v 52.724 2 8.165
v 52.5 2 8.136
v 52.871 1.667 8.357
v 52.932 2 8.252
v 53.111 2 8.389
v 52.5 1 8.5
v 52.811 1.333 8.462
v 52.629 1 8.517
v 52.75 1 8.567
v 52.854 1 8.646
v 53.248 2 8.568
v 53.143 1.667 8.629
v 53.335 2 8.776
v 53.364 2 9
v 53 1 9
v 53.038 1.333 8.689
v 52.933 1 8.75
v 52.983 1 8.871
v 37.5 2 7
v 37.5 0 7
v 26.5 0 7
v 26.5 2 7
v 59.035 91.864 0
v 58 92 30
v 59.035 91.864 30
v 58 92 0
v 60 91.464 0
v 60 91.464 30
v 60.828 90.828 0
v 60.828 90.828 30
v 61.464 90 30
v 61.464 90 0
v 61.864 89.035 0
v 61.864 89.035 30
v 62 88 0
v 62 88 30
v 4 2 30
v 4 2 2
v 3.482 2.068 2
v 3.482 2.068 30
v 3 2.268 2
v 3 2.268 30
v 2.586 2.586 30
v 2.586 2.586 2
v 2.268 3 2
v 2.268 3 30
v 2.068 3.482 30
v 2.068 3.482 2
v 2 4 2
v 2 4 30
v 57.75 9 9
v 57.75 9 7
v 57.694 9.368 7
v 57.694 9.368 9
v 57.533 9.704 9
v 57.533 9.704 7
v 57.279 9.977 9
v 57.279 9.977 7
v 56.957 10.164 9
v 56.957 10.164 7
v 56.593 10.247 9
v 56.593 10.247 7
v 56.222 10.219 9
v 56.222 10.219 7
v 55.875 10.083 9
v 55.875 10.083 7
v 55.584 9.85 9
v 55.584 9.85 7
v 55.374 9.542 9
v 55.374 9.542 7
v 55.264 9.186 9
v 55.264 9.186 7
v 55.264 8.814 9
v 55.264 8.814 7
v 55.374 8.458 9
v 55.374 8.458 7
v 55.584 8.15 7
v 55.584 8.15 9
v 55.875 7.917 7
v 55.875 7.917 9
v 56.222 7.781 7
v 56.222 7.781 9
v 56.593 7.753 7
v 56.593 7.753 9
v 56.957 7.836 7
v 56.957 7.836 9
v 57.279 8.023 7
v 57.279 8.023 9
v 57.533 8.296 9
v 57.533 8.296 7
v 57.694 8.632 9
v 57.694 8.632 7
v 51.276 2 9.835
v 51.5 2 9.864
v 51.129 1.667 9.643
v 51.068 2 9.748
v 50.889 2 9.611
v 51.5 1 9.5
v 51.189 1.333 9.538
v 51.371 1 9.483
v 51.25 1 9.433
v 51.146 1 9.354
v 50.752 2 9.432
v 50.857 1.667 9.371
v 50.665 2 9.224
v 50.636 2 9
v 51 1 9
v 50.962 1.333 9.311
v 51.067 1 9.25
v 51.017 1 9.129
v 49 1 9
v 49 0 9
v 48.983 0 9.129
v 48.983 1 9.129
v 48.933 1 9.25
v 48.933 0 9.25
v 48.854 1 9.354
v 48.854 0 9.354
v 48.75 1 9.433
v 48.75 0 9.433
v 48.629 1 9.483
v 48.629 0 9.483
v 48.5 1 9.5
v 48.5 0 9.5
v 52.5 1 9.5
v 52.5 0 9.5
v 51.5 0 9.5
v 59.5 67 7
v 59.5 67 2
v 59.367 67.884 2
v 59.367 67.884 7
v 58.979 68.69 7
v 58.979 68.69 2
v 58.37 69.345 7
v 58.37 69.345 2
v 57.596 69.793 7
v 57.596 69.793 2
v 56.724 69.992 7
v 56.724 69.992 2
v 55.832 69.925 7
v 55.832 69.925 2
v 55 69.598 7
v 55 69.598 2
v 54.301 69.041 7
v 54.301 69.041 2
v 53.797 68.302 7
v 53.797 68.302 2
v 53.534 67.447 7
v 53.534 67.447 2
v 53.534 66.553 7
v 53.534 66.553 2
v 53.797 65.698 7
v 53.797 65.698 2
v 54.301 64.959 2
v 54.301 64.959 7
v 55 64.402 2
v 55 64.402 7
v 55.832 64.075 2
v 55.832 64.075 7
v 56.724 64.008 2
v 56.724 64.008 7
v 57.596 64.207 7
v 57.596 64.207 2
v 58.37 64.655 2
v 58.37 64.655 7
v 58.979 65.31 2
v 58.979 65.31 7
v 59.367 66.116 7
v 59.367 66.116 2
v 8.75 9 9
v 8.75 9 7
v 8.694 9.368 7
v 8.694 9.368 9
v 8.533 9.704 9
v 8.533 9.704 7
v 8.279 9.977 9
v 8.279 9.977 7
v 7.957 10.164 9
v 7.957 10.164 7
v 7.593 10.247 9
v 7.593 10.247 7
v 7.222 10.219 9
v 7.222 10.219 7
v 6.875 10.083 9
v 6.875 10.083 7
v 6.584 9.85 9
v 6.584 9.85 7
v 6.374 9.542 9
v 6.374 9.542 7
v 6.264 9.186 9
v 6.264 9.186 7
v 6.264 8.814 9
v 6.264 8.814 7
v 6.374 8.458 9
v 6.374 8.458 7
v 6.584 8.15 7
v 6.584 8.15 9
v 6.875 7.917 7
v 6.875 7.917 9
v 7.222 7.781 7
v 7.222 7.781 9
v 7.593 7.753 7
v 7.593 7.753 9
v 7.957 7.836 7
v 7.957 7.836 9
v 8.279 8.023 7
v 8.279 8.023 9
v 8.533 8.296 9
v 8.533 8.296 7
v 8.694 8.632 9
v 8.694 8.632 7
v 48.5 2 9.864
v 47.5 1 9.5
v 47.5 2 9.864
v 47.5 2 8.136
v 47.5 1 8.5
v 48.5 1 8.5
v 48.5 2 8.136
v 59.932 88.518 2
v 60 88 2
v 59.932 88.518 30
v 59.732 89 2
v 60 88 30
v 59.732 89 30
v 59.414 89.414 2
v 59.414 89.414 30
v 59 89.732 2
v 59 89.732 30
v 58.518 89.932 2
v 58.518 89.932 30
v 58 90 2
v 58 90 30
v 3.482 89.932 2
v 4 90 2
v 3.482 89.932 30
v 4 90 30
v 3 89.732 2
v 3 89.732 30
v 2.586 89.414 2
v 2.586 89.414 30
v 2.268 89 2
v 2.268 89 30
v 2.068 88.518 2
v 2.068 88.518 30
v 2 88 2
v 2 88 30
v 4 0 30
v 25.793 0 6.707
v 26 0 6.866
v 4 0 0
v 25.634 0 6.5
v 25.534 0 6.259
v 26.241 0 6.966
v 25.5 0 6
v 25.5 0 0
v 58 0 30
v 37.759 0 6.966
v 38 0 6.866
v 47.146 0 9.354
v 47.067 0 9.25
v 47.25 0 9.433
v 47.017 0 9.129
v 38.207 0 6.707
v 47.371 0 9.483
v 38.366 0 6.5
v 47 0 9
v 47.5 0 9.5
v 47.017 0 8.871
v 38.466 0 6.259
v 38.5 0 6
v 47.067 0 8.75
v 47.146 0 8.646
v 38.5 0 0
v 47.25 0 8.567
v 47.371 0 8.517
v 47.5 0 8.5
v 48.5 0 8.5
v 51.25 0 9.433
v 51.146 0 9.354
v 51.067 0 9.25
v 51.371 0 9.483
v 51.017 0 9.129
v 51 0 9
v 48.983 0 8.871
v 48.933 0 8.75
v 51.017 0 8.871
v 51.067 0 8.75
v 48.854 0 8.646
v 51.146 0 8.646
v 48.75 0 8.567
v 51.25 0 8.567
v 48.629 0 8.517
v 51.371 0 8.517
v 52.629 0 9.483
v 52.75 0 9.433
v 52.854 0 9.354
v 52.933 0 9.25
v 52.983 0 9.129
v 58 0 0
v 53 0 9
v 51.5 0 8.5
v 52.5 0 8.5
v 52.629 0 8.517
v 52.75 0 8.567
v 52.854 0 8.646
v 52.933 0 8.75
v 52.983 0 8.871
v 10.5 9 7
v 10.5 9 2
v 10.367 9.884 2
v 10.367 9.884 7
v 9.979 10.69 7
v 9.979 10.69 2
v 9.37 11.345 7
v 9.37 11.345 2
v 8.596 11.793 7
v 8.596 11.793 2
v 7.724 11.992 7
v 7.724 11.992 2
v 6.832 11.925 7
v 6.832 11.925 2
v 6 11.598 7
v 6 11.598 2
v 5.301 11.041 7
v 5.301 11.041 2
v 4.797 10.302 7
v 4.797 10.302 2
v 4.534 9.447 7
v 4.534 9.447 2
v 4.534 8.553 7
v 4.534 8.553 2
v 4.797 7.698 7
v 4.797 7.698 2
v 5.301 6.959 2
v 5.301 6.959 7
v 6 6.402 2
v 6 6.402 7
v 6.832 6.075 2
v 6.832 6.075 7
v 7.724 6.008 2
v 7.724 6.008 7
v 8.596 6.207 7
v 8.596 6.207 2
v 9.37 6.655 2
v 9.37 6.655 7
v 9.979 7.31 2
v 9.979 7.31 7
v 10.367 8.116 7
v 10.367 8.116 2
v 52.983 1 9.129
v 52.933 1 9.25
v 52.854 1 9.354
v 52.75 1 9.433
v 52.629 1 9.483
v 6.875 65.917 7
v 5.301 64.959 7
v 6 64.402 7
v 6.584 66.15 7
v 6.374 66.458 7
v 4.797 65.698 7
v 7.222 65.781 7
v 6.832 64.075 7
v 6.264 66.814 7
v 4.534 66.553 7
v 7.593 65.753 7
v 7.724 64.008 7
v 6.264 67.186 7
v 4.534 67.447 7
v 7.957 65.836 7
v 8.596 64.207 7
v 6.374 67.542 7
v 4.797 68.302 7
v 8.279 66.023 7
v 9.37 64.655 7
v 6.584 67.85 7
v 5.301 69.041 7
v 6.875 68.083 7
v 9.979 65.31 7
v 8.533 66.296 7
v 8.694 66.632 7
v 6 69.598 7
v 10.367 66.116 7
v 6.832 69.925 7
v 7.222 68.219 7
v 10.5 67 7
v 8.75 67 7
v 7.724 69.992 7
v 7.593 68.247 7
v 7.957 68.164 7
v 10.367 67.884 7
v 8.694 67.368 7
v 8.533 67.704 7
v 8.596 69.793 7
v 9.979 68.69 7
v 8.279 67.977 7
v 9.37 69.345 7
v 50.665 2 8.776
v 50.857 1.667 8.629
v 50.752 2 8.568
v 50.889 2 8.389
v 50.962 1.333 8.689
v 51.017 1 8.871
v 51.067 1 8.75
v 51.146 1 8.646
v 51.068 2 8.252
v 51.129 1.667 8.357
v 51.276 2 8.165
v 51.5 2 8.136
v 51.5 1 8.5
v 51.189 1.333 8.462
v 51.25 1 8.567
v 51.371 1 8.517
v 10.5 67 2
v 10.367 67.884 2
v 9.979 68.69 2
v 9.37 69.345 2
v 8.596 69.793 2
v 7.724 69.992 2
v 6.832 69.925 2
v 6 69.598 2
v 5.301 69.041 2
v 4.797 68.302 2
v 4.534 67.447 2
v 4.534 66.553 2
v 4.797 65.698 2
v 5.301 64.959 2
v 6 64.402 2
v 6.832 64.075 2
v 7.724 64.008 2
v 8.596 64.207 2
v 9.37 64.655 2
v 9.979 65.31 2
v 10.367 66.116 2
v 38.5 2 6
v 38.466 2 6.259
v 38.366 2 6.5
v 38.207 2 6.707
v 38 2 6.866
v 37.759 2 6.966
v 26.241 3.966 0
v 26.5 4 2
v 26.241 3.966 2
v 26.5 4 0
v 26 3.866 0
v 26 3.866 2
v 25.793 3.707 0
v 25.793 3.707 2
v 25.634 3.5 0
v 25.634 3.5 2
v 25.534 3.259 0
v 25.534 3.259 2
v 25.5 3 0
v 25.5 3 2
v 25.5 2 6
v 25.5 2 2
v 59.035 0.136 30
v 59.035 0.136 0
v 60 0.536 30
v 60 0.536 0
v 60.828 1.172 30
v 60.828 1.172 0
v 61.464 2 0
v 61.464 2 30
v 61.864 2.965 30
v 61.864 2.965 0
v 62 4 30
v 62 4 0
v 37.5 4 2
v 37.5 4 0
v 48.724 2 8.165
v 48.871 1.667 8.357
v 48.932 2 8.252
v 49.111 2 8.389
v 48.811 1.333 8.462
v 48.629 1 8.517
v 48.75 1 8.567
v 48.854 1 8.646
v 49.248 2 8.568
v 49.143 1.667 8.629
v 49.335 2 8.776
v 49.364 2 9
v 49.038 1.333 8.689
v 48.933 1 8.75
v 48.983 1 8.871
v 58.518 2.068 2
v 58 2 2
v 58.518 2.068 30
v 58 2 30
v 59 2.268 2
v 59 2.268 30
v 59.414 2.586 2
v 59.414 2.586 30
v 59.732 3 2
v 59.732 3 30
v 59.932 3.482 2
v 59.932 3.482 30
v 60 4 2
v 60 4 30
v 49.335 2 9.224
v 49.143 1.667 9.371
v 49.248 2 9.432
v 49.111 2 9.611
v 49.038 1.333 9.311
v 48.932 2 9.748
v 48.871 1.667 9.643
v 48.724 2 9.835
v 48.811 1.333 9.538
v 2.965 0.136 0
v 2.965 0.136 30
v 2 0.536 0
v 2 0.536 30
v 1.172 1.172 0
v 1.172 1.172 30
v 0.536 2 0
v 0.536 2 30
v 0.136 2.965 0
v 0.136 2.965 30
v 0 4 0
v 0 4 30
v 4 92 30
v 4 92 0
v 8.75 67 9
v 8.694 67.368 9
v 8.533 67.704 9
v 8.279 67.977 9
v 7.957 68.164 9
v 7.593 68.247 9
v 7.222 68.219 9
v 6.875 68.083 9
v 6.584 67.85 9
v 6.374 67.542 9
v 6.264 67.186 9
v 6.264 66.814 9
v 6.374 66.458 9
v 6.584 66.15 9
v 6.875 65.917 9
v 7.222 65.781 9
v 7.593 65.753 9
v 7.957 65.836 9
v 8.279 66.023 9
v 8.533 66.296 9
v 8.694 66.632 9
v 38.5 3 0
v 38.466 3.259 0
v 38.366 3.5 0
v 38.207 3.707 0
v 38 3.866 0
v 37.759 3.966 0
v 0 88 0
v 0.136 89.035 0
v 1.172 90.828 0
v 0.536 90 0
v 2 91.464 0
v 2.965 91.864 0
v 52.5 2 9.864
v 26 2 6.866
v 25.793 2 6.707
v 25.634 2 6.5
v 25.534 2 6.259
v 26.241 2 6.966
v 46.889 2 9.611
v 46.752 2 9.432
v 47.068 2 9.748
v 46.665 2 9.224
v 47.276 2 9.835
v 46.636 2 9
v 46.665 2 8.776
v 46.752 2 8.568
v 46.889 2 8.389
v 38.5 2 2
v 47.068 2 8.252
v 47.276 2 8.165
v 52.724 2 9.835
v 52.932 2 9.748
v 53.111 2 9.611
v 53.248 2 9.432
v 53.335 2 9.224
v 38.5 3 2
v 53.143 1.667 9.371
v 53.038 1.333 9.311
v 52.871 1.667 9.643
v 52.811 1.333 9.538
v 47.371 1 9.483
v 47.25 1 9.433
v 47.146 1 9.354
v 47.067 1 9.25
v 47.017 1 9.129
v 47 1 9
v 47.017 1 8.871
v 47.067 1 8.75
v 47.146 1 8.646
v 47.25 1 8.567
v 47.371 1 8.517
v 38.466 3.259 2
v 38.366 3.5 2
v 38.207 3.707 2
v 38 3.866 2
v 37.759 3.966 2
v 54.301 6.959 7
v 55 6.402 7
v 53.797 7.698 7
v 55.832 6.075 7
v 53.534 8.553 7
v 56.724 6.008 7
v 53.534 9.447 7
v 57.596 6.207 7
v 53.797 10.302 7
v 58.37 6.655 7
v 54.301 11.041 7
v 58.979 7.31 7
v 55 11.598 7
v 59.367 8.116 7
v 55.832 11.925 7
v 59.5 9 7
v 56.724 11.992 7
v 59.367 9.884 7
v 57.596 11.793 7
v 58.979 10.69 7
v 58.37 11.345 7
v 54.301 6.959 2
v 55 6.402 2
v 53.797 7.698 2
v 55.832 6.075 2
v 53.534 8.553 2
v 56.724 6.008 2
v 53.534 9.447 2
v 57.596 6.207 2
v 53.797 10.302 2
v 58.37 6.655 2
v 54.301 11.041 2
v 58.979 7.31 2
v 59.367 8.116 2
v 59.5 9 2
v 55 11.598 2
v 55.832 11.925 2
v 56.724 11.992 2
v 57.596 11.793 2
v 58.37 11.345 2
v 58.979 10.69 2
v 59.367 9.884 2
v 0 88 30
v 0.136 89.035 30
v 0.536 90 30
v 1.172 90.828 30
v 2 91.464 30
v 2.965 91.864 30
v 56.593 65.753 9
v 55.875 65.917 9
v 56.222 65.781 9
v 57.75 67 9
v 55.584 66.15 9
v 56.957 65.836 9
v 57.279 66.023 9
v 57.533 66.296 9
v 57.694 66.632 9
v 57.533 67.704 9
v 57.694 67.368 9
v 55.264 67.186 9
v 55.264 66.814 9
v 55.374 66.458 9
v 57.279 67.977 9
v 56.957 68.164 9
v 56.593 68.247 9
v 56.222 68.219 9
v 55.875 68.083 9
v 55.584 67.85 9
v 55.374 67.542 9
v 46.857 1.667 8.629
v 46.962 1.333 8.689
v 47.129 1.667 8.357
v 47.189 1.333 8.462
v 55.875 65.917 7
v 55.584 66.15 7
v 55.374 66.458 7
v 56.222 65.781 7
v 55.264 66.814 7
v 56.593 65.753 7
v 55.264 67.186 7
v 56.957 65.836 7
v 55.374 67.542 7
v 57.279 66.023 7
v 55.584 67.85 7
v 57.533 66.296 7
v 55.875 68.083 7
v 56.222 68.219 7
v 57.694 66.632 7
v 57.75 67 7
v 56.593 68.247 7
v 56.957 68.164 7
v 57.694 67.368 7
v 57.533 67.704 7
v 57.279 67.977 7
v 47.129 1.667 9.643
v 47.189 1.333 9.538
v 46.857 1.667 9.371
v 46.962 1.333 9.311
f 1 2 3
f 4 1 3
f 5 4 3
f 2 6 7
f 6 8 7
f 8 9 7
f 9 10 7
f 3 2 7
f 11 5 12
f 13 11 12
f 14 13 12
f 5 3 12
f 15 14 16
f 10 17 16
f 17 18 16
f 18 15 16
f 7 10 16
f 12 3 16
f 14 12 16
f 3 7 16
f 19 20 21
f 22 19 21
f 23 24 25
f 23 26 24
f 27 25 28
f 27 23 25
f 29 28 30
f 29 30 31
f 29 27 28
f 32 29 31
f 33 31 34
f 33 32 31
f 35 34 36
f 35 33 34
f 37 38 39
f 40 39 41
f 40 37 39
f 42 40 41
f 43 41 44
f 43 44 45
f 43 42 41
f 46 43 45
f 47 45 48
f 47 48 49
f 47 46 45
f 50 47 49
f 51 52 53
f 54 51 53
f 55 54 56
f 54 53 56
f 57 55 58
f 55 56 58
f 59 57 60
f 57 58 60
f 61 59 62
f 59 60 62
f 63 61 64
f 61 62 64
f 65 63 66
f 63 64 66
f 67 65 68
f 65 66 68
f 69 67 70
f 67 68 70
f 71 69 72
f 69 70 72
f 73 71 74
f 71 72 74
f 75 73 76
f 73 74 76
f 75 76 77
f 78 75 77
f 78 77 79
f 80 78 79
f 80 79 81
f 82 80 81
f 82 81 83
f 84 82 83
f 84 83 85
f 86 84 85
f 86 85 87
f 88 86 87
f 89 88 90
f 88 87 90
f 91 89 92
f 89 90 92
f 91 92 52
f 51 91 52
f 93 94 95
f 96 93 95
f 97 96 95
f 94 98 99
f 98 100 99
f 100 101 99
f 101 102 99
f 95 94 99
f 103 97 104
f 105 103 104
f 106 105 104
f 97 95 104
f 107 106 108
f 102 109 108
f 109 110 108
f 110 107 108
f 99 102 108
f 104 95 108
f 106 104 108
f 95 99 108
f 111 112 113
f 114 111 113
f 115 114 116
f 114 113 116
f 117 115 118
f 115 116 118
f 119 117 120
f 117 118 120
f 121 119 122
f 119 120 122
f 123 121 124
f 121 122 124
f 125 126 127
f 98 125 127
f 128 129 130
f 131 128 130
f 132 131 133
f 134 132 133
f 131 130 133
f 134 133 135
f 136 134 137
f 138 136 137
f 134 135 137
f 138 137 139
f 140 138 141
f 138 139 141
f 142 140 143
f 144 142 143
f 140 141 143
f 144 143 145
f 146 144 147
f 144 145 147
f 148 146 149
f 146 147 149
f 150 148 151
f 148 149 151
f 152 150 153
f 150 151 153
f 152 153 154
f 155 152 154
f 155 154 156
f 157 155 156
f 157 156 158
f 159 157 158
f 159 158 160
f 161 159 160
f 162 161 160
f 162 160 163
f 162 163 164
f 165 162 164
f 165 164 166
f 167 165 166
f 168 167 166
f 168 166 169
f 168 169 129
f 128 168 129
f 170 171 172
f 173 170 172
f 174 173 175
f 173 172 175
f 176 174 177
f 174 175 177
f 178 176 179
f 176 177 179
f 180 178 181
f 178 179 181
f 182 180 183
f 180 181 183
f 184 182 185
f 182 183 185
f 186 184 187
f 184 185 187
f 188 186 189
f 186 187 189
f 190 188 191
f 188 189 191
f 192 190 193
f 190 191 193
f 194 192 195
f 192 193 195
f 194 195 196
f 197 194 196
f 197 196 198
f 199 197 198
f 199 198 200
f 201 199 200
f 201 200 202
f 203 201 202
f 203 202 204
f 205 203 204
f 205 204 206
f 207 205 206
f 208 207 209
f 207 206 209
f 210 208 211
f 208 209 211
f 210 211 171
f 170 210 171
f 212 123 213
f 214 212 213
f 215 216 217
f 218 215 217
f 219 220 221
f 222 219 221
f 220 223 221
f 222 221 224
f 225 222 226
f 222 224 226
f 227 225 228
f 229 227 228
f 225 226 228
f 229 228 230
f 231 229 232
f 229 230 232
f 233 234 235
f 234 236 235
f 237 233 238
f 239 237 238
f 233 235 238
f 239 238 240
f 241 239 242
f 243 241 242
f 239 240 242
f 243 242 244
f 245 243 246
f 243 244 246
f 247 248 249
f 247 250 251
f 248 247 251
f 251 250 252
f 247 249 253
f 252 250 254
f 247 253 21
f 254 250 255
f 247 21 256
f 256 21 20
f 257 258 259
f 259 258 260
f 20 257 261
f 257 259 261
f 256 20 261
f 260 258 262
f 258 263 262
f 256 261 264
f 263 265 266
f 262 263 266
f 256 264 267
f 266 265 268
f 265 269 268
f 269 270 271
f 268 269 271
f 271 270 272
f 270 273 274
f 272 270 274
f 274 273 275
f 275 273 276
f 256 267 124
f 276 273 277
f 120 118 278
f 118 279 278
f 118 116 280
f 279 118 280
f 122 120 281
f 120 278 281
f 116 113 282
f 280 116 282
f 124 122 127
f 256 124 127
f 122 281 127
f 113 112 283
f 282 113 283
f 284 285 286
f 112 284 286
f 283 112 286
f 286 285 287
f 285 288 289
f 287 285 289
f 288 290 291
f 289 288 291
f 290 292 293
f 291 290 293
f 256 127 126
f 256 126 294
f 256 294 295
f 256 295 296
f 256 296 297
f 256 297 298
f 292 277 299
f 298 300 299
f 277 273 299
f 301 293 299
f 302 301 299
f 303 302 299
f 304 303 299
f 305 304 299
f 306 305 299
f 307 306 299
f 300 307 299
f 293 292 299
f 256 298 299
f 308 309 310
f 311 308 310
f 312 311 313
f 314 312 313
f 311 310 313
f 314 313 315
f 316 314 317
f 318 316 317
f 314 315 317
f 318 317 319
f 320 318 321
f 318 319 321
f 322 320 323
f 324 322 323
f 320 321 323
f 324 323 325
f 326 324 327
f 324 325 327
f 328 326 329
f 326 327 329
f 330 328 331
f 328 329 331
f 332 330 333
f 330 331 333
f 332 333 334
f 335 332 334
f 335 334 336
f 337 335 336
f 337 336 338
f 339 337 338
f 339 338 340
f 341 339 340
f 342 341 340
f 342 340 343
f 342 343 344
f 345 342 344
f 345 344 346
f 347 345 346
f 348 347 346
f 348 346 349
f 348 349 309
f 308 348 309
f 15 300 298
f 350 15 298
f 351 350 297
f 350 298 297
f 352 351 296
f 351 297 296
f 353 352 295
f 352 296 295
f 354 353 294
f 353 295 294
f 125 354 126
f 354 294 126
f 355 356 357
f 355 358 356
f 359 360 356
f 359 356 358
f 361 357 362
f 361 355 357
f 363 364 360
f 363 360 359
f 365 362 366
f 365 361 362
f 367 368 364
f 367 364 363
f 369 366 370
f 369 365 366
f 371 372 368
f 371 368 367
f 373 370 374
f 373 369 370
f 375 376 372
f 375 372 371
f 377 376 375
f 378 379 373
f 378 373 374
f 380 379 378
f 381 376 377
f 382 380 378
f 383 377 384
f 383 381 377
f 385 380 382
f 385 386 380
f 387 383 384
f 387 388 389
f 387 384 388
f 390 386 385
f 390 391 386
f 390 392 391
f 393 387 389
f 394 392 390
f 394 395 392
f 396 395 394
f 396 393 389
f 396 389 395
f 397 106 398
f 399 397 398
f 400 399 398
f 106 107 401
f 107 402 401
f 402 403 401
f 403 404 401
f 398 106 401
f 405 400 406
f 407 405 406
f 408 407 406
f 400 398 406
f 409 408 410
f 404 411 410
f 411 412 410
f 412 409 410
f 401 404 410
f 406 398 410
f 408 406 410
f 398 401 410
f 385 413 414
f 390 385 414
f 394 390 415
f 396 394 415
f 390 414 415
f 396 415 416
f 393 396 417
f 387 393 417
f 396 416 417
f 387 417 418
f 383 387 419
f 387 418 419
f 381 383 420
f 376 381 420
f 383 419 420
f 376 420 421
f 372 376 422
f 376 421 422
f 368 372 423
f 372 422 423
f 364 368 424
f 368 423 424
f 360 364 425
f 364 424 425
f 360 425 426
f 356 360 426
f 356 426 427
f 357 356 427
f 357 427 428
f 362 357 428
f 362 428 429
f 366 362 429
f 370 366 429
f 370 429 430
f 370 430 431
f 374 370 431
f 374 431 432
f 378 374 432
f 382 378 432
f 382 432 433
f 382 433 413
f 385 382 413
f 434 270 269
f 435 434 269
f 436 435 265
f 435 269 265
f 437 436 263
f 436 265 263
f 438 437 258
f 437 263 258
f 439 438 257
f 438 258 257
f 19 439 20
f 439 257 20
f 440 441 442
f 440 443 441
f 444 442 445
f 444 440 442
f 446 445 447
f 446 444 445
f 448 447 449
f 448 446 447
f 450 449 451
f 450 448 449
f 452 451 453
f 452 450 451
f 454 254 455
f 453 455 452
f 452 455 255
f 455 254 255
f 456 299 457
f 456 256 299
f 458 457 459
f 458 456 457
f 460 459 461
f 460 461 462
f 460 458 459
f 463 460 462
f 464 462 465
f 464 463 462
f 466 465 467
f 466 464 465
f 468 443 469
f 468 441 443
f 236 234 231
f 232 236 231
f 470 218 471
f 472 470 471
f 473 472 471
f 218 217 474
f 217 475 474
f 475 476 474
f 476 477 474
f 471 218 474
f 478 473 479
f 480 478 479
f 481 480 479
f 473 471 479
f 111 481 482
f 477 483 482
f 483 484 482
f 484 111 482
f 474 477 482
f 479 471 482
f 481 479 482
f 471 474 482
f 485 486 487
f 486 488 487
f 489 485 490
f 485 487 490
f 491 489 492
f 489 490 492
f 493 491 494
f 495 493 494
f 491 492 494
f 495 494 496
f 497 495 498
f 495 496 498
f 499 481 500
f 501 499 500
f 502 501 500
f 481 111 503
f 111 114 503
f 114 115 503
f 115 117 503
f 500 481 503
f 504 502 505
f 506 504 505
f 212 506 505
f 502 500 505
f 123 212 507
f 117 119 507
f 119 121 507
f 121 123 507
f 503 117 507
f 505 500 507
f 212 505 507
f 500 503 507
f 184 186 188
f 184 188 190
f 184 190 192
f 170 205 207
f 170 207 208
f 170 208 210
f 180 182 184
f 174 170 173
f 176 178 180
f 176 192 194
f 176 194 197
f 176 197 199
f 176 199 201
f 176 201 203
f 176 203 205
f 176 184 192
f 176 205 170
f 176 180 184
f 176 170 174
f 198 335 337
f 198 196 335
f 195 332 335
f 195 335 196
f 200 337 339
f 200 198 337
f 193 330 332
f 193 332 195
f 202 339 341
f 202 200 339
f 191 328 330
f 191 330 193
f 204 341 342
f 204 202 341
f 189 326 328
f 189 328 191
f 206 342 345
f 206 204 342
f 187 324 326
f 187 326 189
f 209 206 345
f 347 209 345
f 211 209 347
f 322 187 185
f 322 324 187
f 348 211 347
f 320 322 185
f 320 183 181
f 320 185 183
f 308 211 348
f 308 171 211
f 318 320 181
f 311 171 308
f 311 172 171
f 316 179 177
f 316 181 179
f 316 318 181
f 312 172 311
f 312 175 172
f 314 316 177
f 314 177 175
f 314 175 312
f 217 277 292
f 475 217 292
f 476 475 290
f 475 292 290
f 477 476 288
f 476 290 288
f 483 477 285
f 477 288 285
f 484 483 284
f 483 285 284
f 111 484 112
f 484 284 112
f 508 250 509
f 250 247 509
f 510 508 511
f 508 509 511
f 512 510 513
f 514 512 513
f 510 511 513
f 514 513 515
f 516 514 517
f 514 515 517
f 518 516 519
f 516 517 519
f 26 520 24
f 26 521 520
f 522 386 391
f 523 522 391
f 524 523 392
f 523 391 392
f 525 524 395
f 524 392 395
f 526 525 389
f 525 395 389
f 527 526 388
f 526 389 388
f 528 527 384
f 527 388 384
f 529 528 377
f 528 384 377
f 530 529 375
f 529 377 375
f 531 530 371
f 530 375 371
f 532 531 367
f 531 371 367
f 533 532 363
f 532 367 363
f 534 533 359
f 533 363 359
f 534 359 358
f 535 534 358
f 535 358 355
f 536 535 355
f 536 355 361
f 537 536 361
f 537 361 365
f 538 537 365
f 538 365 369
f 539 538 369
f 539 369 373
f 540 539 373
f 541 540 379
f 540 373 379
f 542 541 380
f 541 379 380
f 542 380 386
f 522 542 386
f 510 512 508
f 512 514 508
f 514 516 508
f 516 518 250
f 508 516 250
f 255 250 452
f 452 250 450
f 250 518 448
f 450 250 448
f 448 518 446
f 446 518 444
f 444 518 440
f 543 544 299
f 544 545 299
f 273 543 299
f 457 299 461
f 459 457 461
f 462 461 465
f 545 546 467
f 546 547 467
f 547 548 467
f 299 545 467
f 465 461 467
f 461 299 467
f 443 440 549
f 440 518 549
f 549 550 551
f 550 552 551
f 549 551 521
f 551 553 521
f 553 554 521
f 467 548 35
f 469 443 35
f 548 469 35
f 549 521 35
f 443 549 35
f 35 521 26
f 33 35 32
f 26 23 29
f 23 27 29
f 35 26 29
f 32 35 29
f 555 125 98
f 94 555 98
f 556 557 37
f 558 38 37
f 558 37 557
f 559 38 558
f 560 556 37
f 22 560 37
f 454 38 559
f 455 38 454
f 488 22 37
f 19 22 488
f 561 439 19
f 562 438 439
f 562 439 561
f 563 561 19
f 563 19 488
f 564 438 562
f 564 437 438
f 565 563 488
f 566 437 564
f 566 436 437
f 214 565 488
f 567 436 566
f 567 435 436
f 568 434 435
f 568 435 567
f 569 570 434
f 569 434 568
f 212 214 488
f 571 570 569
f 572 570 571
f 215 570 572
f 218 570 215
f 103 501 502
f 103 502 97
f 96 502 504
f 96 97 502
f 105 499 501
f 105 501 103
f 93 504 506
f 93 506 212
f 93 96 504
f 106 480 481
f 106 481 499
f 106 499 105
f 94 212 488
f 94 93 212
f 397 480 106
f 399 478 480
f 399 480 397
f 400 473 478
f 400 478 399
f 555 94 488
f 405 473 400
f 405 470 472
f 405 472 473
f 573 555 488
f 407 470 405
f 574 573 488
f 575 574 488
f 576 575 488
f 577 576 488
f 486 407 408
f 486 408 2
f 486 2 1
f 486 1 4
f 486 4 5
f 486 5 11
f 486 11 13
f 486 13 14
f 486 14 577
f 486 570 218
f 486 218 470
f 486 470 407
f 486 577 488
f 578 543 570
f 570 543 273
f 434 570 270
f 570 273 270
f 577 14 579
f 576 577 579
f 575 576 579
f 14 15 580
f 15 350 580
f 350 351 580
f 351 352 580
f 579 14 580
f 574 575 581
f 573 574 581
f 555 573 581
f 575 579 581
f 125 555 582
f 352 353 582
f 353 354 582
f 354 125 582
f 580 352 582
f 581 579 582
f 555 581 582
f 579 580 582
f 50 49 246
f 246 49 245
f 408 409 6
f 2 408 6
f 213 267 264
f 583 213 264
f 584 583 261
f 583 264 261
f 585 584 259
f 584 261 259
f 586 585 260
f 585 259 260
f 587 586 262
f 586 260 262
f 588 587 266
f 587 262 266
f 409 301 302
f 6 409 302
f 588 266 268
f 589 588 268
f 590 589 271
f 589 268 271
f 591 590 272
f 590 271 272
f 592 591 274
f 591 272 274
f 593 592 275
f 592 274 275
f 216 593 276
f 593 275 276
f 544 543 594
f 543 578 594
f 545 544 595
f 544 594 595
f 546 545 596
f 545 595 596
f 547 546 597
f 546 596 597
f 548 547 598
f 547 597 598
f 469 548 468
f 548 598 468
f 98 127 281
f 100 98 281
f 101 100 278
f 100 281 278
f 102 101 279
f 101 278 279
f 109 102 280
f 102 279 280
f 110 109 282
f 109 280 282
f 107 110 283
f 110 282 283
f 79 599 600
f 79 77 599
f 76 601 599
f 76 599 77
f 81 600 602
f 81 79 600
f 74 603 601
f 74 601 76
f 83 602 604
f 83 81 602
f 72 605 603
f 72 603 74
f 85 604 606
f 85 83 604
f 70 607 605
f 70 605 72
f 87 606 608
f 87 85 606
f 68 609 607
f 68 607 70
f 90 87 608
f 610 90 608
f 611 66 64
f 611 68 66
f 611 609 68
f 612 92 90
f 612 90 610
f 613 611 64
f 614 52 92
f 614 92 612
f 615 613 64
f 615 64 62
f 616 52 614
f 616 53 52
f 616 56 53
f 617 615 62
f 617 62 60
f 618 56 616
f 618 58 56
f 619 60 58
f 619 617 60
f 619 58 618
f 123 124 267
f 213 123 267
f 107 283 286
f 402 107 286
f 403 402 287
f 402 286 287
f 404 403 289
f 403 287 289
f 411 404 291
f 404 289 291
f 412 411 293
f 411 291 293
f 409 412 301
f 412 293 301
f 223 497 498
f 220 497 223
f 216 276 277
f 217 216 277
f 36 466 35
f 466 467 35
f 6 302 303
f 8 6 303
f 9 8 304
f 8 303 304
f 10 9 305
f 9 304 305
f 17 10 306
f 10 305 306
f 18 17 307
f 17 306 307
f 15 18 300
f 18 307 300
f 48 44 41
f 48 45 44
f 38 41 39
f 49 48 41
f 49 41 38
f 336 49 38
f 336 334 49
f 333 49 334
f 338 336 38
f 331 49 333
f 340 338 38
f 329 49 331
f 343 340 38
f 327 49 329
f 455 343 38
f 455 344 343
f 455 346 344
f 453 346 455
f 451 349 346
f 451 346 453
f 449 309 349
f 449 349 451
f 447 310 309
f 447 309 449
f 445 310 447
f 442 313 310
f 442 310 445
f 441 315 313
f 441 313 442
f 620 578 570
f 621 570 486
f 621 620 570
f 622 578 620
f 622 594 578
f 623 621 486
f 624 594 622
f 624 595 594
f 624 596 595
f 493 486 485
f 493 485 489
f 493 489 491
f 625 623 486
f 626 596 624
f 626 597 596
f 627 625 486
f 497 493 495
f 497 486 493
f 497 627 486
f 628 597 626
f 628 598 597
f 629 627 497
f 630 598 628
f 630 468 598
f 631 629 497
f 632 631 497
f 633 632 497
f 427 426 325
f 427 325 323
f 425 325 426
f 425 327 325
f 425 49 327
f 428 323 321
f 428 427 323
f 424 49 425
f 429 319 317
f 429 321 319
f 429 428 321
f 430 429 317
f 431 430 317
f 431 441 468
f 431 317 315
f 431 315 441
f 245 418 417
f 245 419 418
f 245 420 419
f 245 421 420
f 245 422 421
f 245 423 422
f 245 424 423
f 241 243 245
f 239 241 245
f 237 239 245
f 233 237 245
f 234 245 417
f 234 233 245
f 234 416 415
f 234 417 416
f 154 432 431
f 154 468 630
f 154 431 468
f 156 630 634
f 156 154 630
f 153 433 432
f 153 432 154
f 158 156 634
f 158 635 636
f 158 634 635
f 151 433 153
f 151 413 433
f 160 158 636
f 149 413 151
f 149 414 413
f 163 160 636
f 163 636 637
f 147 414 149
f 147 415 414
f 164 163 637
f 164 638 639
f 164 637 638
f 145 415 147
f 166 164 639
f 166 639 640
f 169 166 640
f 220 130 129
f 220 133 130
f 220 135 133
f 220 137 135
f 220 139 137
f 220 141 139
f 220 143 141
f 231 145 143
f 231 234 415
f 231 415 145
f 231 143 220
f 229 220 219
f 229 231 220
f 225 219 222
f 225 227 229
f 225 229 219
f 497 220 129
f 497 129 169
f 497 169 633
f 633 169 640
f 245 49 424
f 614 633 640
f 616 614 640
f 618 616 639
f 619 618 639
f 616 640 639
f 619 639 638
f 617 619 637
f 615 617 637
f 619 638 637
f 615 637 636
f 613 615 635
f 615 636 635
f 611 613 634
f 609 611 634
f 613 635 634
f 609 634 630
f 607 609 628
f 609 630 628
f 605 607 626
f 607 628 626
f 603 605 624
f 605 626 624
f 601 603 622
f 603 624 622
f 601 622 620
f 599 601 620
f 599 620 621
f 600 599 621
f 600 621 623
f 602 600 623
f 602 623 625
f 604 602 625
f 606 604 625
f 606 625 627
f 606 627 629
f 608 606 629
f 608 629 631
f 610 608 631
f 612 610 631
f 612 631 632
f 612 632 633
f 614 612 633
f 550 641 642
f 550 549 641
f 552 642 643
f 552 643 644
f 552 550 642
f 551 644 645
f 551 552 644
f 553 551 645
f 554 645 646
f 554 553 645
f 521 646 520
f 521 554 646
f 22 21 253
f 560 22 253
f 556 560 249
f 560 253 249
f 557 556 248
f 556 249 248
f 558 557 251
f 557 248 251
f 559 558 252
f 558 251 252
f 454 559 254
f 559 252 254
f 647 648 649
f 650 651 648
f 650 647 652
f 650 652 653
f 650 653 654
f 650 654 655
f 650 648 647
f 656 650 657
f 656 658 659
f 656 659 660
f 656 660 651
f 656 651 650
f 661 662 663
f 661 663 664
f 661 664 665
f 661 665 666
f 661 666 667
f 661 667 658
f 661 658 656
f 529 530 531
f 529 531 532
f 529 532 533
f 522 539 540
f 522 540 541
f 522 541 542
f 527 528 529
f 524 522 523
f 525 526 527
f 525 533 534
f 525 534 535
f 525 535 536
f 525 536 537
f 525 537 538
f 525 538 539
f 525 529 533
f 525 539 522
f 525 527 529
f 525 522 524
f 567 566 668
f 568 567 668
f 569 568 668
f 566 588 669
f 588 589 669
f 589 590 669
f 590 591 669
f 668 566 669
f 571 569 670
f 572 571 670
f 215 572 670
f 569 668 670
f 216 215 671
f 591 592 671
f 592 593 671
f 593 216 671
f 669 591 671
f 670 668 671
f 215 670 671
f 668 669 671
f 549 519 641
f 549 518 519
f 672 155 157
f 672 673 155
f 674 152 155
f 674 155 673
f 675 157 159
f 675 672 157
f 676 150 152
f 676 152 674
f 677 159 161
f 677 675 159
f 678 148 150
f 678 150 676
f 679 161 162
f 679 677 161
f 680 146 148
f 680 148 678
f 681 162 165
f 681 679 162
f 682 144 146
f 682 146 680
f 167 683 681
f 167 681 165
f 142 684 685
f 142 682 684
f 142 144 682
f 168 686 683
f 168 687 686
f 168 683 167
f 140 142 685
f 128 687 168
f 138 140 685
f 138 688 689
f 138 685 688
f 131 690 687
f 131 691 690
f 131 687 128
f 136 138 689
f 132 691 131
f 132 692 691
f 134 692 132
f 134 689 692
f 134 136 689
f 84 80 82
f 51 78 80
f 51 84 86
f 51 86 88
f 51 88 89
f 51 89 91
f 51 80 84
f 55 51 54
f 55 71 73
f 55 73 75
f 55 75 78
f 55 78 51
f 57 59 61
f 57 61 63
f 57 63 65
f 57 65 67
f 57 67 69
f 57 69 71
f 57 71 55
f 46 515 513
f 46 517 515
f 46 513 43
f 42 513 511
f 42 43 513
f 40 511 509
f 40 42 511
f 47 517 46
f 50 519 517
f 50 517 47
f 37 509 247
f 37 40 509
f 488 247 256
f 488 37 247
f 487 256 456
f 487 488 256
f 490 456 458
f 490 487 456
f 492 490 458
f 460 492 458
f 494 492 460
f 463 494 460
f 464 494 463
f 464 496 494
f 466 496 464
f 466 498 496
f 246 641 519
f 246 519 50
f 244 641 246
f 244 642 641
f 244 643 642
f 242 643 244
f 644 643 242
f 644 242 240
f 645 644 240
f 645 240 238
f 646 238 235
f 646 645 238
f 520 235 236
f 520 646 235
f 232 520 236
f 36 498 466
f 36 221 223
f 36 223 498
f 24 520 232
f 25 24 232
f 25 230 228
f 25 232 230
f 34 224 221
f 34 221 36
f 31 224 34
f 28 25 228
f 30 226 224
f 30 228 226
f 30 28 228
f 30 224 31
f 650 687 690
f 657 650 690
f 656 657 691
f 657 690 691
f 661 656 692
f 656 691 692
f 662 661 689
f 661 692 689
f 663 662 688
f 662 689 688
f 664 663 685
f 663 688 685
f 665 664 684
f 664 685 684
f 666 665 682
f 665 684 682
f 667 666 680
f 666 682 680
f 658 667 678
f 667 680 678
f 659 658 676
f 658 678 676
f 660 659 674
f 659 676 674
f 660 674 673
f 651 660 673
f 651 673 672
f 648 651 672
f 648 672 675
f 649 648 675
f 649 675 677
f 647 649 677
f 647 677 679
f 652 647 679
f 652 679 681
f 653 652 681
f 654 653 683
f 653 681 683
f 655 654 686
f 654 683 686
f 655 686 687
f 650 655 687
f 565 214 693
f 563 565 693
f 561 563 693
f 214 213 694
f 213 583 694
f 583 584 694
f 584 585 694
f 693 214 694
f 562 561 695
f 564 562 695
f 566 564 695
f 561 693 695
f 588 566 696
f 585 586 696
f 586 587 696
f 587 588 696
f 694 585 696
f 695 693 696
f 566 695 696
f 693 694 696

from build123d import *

# Parameters (mm, degrees)
F0_W      = 62
F0_H      = 92
F1_DEPTH  = 2
F2_W      = 62
F2_H      = 92
F2_W_2    = 58
F2_H_2    = 88
F2_R      = 3
F3_DEPTH  = 28
F4_DEPTH  = 23
F5_R      = 1.25
F6_DEPTH  = 2
F7_R      = 1.25
F8_DEPTH  = 2
F9_R      = 1.25
F10_DEPTH = 2
F11_R     = 1.25
F12_DEPTH = 2
F14_DEPTH = 4
F15_R     = 1
F16_R     = 2
F17_R     = 4
F18_SIZE2 = 1
F18_SIZE  = 0.3639702343


with BuildPart() as f1:
    # F0 (on Top) → F1 (new body)
    with BuildSketch(Plane.XY):
        with Locations((31, 46)):
            Rectangle(F0_W, F0_H)
    extrude(amount=F1_DEPTH)

    # F2 (on face) → F3 (join)
    with BuildSketch(Plane.XY.offset(2)):
        with Locations((31, 46)):
            Rectangle(F2_W, F2_H)
        with Locations((31, 46)):
            Rectangle(F2_W_2, F2_H_2, mode=Mode.SUBTRACT)
        with Locations((7.5, 67)):
            Circle(F2_R)
        with Locations((56.5, 67)):
            Circle(F2_R)
        with Locations((7.5, 9)):
            Circle(F2_R)
        with Locations((56.5, 9)):
            Circle(F2_R)
    extrude(amount=F3_DEPTH)

    # F4 (cut): faces of the model
    f4_faces = [f1.faces().sort_by_distance(p)[0] for p in [
        (7.5, 67, 30),
        (56.5, 67, 30),
        (56.5, 9, 30),
        (7.5, 9, 30),
    ]]
    extrude(f4_faces, amount=-F4_DEPTH, mode=Mode.SUBTRACT)

    # F5 (on face) → F6 (join)
    with BuildSketch(Plane.XY.offset(7)):
        with Locations((7.5, 9)):
            Circle(F5_R)
    extrude(amount=F6_DEPTH)

    # F7 (on face) → F8 (join)
    with BuildSketch(Plane.XY.offset(7)):
        with Locations((56.5, 9)):
            Circle(F7_R)
    extrude(amount=F8_DEPTH)

    # F9 (on face) → F10 (join)
    with BuildSketch(Plane.XY.offset(7)):
        with Locations((56.5, 67)):
            Circle(F9_R)
    extrude(amount=F10_DEPTH)

    # F11 (on face) → F12 (join)
    with BuildSketch(Plane.XY.offset(7)):
        with Locations((7.5, 67)):
            Circle(F11_R)
    extrude(amount=F12_DEPTH)

    # F13 (on face) → F14 (cut)
    with BuildSketch(Plane.XZ):
        with BuildLine():
            ThreePointArc((38.5, 6), (38.2071067812, 6.7071067812), (37.5, 7))
            Line((37.5, 7), (26.5, 7))
            ThreePointArc((26.5, 7), (25.7928932188, 6.7071067812), (25.5, 6))
            Line((25.5, 6), (25.5, 0))
            Line((25.5, 0), (38.5, 0))
            Line((38.5, 0), (38.5, 6))
        make_face()
        with BuildLine():
            Line((48.5, 9.5), (47.5, 9.5))
            ThreePointArc((47.5, 9.5), (47.1464466094, 9.3535533906), (47, 9))
            ThreePointArc((47, 9), (47.1464466094, 8.6464466094), (47.5, 8.5))
            Line((47.5, 8.5), (48.5, 8.5))
            ThreePointArc((48.5, 8.5), (48.8535533906, 8.6464466094), (49, 9))
            ThreePointArc((49, 9), (48.8535533906, 9.3535533906), (48.5, 9.5))
        make_face()
        with BuildLine():
            Line((52.5, 9.5), (51.5, 9.5))
            ThreePointArc((51.5, 9.5), (51.1464466094, 9.3535533906), (51, 9))
            ThreePointArc((51, 9), (51.1464466094, 8.6464466094), (51.5, 8.5))
            Line((51.5, 8.5), (52.5, 8.5))
            ThreePointArc((52.5, 8.5), (52.8535533906, 8.6464466094), (53, 9))
            ThreePointArc((53, 9), (52.8535533906, 9.3535533906), (52.5, 9.5))
        make_face()
    extrude(amount=-F14_DEPTH, mode=Mode.SUBTRACT)

    # F15
    f15_edges = [f1.edges().sort_by_distance(p)[0] for p in [
        (25.5, 4, 1),
        (38.5, 4, 1),
    ]]
    fillet(f15_edges, radius=F15_R)

    # F16
    f16_edges = [f1.edges().sort_by_distance(p)[0] for p in [
        (2, 90, 16),
        (60, 90, 16),
        (60, 2, 16),
        (2, 2, 16),
    ]]
    fillet(f16_edges, radius=F16_R)

    # F17
    f17_edges = [f1.edges().sort_by_distance(p)[0] for p in [
        (0, 92, 15),
        (62, 92, 15),
        (62, 0, 15),
        (0, 0, 15),
    ]]
    fillet(f17_edges, radius=F17_R)

    # F18
    f18_edges = [f1.edges().sort_by_distance(p)[0] for p in [
        (51, 2, 9),
        (47, 2, 9),
    ]]
    f18_side = f1.faces().sort_by_distance((30.90829, 2, 16.53228))[0]
    chamfer(f18_edges, length=F18_SIZE, length2=F18_SIZE2, reference=f18_side)


solid = f1.part
